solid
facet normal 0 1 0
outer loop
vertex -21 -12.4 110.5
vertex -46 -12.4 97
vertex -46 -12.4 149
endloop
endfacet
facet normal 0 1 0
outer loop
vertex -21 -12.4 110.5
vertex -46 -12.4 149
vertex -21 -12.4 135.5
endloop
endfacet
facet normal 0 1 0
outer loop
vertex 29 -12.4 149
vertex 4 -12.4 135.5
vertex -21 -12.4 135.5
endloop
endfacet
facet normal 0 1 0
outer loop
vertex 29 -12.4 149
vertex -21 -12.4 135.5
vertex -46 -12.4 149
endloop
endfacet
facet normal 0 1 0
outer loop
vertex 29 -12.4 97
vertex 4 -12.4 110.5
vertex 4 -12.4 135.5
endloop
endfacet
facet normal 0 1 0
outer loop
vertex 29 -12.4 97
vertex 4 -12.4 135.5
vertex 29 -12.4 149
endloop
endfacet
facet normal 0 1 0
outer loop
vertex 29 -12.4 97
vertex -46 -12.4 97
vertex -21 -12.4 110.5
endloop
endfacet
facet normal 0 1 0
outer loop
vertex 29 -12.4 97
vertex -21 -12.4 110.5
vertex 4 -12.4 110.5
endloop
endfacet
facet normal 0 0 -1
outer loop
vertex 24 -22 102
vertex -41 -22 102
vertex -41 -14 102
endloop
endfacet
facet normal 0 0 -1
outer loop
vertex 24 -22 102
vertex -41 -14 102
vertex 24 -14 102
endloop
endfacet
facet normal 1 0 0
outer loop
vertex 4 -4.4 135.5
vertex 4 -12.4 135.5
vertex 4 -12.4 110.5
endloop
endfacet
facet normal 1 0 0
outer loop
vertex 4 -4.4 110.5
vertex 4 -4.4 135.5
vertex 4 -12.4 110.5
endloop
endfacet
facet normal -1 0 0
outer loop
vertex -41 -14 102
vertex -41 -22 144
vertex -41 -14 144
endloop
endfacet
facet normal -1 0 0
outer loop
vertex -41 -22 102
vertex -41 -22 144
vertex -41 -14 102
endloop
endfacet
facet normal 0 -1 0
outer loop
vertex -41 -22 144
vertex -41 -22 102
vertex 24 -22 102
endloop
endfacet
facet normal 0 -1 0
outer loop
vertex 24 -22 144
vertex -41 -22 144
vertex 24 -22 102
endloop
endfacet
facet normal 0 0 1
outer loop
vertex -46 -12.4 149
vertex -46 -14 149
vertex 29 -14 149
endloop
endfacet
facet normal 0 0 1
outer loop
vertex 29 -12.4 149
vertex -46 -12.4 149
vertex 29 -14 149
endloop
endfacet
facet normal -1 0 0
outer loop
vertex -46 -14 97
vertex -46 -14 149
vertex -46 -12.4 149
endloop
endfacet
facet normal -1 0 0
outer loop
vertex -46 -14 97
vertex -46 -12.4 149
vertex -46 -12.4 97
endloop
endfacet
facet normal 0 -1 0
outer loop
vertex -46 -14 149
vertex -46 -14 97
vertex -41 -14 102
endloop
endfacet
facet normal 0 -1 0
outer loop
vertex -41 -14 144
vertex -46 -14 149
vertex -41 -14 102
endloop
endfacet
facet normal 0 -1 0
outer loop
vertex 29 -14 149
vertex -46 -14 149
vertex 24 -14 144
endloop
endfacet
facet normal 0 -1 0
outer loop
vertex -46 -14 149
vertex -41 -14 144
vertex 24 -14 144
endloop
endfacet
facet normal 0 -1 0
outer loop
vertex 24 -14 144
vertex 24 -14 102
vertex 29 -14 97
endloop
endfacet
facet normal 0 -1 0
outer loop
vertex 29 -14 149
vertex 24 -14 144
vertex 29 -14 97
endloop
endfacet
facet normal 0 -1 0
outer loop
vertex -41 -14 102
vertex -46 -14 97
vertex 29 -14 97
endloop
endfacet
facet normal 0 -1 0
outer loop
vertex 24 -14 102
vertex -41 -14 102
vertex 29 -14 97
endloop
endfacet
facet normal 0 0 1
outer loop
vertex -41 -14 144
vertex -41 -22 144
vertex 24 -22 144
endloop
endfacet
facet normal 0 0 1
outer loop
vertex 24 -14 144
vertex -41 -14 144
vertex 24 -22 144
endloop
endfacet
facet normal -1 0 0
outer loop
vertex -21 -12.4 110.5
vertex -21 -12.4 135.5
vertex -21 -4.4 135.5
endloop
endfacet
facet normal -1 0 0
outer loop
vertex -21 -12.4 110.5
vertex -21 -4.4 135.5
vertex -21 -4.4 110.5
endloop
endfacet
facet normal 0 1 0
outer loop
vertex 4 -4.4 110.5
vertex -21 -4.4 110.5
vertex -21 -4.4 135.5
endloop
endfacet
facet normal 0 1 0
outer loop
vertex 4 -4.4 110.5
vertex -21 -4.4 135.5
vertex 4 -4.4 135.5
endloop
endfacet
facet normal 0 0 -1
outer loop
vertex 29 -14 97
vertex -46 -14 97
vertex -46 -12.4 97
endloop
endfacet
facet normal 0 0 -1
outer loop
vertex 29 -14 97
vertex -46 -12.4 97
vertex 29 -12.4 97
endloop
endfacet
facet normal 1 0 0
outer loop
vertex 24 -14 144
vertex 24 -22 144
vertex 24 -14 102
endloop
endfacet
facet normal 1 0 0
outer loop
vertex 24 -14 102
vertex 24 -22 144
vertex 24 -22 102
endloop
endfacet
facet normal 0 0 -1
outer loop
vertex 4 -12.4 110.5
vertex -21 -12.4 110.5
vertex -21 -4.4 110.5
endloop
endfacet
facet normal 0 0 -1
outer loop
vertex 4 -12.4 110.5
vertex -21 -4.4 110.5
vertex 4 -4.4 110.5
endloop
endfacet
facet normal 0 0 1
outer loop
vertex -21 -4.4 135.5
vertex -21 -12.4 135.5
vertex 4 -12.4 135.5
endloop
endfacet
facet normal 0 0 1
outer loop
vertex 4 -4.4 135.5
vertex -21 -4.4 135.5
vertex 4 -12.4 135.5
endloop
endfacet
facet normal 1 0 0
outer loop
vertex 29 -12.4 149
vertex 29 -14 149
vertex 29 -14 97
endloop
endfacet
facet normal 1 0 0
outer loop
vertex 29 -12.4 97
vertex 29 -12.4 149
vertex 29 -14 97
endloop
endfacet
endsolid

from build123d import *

# Parameters (mm, degrees)
SKETCH1_W        = 75
SKETCH1_H        = 52
ESP32_PCB_DEPTH  = 1.6
SKETCH2_W        = 25
SKETCH2_H        = 25
GNSS_PATCH_DEPTH = 8
SKETCH3_W        = 65
SKETCH3_H        = 42
LIPO_DEPTH       = 8


with BuildPart() as part:
    # Sketch1 → ESP32 PCB (new body)
    with BuildSketch(Plane(origin=(0, -14, 0), x_dir=(1, 0, 0), z_dir=(0, 1, 0))):
        with Locations((-8.5, -123)):
            Rectangle(SKETCH1_W, SKETCH1_H)
    extrude(amount=ESP32_PCB_DEPTH)

    # Sketch2 → GNSS Patch (add)
    with BuildSketch(Plane(origin=(0, -12.4, 0), x_dir=(1, 0, 0), z_dir=(0, 1, 0))):
        with Locations((-8.5, -123)):
            Rectangle(SKETCH2_W, SKETCH2_H)
    extrude(amount=GNSS_PATCH_DEPTH)

    # Sketch3 → LiPo (add)
    with BuildSketch(Plane(origin=(0, -22, 0), x_dir=(1, 0, 0), z_dir=(0, 1, 0))):
        with Locations((-8.5, -123)):
            Rectangle(SKETCH3_W, SKETCH3_H)
    extrude(amount=LIPO_DEPTH)


solid = part.part
